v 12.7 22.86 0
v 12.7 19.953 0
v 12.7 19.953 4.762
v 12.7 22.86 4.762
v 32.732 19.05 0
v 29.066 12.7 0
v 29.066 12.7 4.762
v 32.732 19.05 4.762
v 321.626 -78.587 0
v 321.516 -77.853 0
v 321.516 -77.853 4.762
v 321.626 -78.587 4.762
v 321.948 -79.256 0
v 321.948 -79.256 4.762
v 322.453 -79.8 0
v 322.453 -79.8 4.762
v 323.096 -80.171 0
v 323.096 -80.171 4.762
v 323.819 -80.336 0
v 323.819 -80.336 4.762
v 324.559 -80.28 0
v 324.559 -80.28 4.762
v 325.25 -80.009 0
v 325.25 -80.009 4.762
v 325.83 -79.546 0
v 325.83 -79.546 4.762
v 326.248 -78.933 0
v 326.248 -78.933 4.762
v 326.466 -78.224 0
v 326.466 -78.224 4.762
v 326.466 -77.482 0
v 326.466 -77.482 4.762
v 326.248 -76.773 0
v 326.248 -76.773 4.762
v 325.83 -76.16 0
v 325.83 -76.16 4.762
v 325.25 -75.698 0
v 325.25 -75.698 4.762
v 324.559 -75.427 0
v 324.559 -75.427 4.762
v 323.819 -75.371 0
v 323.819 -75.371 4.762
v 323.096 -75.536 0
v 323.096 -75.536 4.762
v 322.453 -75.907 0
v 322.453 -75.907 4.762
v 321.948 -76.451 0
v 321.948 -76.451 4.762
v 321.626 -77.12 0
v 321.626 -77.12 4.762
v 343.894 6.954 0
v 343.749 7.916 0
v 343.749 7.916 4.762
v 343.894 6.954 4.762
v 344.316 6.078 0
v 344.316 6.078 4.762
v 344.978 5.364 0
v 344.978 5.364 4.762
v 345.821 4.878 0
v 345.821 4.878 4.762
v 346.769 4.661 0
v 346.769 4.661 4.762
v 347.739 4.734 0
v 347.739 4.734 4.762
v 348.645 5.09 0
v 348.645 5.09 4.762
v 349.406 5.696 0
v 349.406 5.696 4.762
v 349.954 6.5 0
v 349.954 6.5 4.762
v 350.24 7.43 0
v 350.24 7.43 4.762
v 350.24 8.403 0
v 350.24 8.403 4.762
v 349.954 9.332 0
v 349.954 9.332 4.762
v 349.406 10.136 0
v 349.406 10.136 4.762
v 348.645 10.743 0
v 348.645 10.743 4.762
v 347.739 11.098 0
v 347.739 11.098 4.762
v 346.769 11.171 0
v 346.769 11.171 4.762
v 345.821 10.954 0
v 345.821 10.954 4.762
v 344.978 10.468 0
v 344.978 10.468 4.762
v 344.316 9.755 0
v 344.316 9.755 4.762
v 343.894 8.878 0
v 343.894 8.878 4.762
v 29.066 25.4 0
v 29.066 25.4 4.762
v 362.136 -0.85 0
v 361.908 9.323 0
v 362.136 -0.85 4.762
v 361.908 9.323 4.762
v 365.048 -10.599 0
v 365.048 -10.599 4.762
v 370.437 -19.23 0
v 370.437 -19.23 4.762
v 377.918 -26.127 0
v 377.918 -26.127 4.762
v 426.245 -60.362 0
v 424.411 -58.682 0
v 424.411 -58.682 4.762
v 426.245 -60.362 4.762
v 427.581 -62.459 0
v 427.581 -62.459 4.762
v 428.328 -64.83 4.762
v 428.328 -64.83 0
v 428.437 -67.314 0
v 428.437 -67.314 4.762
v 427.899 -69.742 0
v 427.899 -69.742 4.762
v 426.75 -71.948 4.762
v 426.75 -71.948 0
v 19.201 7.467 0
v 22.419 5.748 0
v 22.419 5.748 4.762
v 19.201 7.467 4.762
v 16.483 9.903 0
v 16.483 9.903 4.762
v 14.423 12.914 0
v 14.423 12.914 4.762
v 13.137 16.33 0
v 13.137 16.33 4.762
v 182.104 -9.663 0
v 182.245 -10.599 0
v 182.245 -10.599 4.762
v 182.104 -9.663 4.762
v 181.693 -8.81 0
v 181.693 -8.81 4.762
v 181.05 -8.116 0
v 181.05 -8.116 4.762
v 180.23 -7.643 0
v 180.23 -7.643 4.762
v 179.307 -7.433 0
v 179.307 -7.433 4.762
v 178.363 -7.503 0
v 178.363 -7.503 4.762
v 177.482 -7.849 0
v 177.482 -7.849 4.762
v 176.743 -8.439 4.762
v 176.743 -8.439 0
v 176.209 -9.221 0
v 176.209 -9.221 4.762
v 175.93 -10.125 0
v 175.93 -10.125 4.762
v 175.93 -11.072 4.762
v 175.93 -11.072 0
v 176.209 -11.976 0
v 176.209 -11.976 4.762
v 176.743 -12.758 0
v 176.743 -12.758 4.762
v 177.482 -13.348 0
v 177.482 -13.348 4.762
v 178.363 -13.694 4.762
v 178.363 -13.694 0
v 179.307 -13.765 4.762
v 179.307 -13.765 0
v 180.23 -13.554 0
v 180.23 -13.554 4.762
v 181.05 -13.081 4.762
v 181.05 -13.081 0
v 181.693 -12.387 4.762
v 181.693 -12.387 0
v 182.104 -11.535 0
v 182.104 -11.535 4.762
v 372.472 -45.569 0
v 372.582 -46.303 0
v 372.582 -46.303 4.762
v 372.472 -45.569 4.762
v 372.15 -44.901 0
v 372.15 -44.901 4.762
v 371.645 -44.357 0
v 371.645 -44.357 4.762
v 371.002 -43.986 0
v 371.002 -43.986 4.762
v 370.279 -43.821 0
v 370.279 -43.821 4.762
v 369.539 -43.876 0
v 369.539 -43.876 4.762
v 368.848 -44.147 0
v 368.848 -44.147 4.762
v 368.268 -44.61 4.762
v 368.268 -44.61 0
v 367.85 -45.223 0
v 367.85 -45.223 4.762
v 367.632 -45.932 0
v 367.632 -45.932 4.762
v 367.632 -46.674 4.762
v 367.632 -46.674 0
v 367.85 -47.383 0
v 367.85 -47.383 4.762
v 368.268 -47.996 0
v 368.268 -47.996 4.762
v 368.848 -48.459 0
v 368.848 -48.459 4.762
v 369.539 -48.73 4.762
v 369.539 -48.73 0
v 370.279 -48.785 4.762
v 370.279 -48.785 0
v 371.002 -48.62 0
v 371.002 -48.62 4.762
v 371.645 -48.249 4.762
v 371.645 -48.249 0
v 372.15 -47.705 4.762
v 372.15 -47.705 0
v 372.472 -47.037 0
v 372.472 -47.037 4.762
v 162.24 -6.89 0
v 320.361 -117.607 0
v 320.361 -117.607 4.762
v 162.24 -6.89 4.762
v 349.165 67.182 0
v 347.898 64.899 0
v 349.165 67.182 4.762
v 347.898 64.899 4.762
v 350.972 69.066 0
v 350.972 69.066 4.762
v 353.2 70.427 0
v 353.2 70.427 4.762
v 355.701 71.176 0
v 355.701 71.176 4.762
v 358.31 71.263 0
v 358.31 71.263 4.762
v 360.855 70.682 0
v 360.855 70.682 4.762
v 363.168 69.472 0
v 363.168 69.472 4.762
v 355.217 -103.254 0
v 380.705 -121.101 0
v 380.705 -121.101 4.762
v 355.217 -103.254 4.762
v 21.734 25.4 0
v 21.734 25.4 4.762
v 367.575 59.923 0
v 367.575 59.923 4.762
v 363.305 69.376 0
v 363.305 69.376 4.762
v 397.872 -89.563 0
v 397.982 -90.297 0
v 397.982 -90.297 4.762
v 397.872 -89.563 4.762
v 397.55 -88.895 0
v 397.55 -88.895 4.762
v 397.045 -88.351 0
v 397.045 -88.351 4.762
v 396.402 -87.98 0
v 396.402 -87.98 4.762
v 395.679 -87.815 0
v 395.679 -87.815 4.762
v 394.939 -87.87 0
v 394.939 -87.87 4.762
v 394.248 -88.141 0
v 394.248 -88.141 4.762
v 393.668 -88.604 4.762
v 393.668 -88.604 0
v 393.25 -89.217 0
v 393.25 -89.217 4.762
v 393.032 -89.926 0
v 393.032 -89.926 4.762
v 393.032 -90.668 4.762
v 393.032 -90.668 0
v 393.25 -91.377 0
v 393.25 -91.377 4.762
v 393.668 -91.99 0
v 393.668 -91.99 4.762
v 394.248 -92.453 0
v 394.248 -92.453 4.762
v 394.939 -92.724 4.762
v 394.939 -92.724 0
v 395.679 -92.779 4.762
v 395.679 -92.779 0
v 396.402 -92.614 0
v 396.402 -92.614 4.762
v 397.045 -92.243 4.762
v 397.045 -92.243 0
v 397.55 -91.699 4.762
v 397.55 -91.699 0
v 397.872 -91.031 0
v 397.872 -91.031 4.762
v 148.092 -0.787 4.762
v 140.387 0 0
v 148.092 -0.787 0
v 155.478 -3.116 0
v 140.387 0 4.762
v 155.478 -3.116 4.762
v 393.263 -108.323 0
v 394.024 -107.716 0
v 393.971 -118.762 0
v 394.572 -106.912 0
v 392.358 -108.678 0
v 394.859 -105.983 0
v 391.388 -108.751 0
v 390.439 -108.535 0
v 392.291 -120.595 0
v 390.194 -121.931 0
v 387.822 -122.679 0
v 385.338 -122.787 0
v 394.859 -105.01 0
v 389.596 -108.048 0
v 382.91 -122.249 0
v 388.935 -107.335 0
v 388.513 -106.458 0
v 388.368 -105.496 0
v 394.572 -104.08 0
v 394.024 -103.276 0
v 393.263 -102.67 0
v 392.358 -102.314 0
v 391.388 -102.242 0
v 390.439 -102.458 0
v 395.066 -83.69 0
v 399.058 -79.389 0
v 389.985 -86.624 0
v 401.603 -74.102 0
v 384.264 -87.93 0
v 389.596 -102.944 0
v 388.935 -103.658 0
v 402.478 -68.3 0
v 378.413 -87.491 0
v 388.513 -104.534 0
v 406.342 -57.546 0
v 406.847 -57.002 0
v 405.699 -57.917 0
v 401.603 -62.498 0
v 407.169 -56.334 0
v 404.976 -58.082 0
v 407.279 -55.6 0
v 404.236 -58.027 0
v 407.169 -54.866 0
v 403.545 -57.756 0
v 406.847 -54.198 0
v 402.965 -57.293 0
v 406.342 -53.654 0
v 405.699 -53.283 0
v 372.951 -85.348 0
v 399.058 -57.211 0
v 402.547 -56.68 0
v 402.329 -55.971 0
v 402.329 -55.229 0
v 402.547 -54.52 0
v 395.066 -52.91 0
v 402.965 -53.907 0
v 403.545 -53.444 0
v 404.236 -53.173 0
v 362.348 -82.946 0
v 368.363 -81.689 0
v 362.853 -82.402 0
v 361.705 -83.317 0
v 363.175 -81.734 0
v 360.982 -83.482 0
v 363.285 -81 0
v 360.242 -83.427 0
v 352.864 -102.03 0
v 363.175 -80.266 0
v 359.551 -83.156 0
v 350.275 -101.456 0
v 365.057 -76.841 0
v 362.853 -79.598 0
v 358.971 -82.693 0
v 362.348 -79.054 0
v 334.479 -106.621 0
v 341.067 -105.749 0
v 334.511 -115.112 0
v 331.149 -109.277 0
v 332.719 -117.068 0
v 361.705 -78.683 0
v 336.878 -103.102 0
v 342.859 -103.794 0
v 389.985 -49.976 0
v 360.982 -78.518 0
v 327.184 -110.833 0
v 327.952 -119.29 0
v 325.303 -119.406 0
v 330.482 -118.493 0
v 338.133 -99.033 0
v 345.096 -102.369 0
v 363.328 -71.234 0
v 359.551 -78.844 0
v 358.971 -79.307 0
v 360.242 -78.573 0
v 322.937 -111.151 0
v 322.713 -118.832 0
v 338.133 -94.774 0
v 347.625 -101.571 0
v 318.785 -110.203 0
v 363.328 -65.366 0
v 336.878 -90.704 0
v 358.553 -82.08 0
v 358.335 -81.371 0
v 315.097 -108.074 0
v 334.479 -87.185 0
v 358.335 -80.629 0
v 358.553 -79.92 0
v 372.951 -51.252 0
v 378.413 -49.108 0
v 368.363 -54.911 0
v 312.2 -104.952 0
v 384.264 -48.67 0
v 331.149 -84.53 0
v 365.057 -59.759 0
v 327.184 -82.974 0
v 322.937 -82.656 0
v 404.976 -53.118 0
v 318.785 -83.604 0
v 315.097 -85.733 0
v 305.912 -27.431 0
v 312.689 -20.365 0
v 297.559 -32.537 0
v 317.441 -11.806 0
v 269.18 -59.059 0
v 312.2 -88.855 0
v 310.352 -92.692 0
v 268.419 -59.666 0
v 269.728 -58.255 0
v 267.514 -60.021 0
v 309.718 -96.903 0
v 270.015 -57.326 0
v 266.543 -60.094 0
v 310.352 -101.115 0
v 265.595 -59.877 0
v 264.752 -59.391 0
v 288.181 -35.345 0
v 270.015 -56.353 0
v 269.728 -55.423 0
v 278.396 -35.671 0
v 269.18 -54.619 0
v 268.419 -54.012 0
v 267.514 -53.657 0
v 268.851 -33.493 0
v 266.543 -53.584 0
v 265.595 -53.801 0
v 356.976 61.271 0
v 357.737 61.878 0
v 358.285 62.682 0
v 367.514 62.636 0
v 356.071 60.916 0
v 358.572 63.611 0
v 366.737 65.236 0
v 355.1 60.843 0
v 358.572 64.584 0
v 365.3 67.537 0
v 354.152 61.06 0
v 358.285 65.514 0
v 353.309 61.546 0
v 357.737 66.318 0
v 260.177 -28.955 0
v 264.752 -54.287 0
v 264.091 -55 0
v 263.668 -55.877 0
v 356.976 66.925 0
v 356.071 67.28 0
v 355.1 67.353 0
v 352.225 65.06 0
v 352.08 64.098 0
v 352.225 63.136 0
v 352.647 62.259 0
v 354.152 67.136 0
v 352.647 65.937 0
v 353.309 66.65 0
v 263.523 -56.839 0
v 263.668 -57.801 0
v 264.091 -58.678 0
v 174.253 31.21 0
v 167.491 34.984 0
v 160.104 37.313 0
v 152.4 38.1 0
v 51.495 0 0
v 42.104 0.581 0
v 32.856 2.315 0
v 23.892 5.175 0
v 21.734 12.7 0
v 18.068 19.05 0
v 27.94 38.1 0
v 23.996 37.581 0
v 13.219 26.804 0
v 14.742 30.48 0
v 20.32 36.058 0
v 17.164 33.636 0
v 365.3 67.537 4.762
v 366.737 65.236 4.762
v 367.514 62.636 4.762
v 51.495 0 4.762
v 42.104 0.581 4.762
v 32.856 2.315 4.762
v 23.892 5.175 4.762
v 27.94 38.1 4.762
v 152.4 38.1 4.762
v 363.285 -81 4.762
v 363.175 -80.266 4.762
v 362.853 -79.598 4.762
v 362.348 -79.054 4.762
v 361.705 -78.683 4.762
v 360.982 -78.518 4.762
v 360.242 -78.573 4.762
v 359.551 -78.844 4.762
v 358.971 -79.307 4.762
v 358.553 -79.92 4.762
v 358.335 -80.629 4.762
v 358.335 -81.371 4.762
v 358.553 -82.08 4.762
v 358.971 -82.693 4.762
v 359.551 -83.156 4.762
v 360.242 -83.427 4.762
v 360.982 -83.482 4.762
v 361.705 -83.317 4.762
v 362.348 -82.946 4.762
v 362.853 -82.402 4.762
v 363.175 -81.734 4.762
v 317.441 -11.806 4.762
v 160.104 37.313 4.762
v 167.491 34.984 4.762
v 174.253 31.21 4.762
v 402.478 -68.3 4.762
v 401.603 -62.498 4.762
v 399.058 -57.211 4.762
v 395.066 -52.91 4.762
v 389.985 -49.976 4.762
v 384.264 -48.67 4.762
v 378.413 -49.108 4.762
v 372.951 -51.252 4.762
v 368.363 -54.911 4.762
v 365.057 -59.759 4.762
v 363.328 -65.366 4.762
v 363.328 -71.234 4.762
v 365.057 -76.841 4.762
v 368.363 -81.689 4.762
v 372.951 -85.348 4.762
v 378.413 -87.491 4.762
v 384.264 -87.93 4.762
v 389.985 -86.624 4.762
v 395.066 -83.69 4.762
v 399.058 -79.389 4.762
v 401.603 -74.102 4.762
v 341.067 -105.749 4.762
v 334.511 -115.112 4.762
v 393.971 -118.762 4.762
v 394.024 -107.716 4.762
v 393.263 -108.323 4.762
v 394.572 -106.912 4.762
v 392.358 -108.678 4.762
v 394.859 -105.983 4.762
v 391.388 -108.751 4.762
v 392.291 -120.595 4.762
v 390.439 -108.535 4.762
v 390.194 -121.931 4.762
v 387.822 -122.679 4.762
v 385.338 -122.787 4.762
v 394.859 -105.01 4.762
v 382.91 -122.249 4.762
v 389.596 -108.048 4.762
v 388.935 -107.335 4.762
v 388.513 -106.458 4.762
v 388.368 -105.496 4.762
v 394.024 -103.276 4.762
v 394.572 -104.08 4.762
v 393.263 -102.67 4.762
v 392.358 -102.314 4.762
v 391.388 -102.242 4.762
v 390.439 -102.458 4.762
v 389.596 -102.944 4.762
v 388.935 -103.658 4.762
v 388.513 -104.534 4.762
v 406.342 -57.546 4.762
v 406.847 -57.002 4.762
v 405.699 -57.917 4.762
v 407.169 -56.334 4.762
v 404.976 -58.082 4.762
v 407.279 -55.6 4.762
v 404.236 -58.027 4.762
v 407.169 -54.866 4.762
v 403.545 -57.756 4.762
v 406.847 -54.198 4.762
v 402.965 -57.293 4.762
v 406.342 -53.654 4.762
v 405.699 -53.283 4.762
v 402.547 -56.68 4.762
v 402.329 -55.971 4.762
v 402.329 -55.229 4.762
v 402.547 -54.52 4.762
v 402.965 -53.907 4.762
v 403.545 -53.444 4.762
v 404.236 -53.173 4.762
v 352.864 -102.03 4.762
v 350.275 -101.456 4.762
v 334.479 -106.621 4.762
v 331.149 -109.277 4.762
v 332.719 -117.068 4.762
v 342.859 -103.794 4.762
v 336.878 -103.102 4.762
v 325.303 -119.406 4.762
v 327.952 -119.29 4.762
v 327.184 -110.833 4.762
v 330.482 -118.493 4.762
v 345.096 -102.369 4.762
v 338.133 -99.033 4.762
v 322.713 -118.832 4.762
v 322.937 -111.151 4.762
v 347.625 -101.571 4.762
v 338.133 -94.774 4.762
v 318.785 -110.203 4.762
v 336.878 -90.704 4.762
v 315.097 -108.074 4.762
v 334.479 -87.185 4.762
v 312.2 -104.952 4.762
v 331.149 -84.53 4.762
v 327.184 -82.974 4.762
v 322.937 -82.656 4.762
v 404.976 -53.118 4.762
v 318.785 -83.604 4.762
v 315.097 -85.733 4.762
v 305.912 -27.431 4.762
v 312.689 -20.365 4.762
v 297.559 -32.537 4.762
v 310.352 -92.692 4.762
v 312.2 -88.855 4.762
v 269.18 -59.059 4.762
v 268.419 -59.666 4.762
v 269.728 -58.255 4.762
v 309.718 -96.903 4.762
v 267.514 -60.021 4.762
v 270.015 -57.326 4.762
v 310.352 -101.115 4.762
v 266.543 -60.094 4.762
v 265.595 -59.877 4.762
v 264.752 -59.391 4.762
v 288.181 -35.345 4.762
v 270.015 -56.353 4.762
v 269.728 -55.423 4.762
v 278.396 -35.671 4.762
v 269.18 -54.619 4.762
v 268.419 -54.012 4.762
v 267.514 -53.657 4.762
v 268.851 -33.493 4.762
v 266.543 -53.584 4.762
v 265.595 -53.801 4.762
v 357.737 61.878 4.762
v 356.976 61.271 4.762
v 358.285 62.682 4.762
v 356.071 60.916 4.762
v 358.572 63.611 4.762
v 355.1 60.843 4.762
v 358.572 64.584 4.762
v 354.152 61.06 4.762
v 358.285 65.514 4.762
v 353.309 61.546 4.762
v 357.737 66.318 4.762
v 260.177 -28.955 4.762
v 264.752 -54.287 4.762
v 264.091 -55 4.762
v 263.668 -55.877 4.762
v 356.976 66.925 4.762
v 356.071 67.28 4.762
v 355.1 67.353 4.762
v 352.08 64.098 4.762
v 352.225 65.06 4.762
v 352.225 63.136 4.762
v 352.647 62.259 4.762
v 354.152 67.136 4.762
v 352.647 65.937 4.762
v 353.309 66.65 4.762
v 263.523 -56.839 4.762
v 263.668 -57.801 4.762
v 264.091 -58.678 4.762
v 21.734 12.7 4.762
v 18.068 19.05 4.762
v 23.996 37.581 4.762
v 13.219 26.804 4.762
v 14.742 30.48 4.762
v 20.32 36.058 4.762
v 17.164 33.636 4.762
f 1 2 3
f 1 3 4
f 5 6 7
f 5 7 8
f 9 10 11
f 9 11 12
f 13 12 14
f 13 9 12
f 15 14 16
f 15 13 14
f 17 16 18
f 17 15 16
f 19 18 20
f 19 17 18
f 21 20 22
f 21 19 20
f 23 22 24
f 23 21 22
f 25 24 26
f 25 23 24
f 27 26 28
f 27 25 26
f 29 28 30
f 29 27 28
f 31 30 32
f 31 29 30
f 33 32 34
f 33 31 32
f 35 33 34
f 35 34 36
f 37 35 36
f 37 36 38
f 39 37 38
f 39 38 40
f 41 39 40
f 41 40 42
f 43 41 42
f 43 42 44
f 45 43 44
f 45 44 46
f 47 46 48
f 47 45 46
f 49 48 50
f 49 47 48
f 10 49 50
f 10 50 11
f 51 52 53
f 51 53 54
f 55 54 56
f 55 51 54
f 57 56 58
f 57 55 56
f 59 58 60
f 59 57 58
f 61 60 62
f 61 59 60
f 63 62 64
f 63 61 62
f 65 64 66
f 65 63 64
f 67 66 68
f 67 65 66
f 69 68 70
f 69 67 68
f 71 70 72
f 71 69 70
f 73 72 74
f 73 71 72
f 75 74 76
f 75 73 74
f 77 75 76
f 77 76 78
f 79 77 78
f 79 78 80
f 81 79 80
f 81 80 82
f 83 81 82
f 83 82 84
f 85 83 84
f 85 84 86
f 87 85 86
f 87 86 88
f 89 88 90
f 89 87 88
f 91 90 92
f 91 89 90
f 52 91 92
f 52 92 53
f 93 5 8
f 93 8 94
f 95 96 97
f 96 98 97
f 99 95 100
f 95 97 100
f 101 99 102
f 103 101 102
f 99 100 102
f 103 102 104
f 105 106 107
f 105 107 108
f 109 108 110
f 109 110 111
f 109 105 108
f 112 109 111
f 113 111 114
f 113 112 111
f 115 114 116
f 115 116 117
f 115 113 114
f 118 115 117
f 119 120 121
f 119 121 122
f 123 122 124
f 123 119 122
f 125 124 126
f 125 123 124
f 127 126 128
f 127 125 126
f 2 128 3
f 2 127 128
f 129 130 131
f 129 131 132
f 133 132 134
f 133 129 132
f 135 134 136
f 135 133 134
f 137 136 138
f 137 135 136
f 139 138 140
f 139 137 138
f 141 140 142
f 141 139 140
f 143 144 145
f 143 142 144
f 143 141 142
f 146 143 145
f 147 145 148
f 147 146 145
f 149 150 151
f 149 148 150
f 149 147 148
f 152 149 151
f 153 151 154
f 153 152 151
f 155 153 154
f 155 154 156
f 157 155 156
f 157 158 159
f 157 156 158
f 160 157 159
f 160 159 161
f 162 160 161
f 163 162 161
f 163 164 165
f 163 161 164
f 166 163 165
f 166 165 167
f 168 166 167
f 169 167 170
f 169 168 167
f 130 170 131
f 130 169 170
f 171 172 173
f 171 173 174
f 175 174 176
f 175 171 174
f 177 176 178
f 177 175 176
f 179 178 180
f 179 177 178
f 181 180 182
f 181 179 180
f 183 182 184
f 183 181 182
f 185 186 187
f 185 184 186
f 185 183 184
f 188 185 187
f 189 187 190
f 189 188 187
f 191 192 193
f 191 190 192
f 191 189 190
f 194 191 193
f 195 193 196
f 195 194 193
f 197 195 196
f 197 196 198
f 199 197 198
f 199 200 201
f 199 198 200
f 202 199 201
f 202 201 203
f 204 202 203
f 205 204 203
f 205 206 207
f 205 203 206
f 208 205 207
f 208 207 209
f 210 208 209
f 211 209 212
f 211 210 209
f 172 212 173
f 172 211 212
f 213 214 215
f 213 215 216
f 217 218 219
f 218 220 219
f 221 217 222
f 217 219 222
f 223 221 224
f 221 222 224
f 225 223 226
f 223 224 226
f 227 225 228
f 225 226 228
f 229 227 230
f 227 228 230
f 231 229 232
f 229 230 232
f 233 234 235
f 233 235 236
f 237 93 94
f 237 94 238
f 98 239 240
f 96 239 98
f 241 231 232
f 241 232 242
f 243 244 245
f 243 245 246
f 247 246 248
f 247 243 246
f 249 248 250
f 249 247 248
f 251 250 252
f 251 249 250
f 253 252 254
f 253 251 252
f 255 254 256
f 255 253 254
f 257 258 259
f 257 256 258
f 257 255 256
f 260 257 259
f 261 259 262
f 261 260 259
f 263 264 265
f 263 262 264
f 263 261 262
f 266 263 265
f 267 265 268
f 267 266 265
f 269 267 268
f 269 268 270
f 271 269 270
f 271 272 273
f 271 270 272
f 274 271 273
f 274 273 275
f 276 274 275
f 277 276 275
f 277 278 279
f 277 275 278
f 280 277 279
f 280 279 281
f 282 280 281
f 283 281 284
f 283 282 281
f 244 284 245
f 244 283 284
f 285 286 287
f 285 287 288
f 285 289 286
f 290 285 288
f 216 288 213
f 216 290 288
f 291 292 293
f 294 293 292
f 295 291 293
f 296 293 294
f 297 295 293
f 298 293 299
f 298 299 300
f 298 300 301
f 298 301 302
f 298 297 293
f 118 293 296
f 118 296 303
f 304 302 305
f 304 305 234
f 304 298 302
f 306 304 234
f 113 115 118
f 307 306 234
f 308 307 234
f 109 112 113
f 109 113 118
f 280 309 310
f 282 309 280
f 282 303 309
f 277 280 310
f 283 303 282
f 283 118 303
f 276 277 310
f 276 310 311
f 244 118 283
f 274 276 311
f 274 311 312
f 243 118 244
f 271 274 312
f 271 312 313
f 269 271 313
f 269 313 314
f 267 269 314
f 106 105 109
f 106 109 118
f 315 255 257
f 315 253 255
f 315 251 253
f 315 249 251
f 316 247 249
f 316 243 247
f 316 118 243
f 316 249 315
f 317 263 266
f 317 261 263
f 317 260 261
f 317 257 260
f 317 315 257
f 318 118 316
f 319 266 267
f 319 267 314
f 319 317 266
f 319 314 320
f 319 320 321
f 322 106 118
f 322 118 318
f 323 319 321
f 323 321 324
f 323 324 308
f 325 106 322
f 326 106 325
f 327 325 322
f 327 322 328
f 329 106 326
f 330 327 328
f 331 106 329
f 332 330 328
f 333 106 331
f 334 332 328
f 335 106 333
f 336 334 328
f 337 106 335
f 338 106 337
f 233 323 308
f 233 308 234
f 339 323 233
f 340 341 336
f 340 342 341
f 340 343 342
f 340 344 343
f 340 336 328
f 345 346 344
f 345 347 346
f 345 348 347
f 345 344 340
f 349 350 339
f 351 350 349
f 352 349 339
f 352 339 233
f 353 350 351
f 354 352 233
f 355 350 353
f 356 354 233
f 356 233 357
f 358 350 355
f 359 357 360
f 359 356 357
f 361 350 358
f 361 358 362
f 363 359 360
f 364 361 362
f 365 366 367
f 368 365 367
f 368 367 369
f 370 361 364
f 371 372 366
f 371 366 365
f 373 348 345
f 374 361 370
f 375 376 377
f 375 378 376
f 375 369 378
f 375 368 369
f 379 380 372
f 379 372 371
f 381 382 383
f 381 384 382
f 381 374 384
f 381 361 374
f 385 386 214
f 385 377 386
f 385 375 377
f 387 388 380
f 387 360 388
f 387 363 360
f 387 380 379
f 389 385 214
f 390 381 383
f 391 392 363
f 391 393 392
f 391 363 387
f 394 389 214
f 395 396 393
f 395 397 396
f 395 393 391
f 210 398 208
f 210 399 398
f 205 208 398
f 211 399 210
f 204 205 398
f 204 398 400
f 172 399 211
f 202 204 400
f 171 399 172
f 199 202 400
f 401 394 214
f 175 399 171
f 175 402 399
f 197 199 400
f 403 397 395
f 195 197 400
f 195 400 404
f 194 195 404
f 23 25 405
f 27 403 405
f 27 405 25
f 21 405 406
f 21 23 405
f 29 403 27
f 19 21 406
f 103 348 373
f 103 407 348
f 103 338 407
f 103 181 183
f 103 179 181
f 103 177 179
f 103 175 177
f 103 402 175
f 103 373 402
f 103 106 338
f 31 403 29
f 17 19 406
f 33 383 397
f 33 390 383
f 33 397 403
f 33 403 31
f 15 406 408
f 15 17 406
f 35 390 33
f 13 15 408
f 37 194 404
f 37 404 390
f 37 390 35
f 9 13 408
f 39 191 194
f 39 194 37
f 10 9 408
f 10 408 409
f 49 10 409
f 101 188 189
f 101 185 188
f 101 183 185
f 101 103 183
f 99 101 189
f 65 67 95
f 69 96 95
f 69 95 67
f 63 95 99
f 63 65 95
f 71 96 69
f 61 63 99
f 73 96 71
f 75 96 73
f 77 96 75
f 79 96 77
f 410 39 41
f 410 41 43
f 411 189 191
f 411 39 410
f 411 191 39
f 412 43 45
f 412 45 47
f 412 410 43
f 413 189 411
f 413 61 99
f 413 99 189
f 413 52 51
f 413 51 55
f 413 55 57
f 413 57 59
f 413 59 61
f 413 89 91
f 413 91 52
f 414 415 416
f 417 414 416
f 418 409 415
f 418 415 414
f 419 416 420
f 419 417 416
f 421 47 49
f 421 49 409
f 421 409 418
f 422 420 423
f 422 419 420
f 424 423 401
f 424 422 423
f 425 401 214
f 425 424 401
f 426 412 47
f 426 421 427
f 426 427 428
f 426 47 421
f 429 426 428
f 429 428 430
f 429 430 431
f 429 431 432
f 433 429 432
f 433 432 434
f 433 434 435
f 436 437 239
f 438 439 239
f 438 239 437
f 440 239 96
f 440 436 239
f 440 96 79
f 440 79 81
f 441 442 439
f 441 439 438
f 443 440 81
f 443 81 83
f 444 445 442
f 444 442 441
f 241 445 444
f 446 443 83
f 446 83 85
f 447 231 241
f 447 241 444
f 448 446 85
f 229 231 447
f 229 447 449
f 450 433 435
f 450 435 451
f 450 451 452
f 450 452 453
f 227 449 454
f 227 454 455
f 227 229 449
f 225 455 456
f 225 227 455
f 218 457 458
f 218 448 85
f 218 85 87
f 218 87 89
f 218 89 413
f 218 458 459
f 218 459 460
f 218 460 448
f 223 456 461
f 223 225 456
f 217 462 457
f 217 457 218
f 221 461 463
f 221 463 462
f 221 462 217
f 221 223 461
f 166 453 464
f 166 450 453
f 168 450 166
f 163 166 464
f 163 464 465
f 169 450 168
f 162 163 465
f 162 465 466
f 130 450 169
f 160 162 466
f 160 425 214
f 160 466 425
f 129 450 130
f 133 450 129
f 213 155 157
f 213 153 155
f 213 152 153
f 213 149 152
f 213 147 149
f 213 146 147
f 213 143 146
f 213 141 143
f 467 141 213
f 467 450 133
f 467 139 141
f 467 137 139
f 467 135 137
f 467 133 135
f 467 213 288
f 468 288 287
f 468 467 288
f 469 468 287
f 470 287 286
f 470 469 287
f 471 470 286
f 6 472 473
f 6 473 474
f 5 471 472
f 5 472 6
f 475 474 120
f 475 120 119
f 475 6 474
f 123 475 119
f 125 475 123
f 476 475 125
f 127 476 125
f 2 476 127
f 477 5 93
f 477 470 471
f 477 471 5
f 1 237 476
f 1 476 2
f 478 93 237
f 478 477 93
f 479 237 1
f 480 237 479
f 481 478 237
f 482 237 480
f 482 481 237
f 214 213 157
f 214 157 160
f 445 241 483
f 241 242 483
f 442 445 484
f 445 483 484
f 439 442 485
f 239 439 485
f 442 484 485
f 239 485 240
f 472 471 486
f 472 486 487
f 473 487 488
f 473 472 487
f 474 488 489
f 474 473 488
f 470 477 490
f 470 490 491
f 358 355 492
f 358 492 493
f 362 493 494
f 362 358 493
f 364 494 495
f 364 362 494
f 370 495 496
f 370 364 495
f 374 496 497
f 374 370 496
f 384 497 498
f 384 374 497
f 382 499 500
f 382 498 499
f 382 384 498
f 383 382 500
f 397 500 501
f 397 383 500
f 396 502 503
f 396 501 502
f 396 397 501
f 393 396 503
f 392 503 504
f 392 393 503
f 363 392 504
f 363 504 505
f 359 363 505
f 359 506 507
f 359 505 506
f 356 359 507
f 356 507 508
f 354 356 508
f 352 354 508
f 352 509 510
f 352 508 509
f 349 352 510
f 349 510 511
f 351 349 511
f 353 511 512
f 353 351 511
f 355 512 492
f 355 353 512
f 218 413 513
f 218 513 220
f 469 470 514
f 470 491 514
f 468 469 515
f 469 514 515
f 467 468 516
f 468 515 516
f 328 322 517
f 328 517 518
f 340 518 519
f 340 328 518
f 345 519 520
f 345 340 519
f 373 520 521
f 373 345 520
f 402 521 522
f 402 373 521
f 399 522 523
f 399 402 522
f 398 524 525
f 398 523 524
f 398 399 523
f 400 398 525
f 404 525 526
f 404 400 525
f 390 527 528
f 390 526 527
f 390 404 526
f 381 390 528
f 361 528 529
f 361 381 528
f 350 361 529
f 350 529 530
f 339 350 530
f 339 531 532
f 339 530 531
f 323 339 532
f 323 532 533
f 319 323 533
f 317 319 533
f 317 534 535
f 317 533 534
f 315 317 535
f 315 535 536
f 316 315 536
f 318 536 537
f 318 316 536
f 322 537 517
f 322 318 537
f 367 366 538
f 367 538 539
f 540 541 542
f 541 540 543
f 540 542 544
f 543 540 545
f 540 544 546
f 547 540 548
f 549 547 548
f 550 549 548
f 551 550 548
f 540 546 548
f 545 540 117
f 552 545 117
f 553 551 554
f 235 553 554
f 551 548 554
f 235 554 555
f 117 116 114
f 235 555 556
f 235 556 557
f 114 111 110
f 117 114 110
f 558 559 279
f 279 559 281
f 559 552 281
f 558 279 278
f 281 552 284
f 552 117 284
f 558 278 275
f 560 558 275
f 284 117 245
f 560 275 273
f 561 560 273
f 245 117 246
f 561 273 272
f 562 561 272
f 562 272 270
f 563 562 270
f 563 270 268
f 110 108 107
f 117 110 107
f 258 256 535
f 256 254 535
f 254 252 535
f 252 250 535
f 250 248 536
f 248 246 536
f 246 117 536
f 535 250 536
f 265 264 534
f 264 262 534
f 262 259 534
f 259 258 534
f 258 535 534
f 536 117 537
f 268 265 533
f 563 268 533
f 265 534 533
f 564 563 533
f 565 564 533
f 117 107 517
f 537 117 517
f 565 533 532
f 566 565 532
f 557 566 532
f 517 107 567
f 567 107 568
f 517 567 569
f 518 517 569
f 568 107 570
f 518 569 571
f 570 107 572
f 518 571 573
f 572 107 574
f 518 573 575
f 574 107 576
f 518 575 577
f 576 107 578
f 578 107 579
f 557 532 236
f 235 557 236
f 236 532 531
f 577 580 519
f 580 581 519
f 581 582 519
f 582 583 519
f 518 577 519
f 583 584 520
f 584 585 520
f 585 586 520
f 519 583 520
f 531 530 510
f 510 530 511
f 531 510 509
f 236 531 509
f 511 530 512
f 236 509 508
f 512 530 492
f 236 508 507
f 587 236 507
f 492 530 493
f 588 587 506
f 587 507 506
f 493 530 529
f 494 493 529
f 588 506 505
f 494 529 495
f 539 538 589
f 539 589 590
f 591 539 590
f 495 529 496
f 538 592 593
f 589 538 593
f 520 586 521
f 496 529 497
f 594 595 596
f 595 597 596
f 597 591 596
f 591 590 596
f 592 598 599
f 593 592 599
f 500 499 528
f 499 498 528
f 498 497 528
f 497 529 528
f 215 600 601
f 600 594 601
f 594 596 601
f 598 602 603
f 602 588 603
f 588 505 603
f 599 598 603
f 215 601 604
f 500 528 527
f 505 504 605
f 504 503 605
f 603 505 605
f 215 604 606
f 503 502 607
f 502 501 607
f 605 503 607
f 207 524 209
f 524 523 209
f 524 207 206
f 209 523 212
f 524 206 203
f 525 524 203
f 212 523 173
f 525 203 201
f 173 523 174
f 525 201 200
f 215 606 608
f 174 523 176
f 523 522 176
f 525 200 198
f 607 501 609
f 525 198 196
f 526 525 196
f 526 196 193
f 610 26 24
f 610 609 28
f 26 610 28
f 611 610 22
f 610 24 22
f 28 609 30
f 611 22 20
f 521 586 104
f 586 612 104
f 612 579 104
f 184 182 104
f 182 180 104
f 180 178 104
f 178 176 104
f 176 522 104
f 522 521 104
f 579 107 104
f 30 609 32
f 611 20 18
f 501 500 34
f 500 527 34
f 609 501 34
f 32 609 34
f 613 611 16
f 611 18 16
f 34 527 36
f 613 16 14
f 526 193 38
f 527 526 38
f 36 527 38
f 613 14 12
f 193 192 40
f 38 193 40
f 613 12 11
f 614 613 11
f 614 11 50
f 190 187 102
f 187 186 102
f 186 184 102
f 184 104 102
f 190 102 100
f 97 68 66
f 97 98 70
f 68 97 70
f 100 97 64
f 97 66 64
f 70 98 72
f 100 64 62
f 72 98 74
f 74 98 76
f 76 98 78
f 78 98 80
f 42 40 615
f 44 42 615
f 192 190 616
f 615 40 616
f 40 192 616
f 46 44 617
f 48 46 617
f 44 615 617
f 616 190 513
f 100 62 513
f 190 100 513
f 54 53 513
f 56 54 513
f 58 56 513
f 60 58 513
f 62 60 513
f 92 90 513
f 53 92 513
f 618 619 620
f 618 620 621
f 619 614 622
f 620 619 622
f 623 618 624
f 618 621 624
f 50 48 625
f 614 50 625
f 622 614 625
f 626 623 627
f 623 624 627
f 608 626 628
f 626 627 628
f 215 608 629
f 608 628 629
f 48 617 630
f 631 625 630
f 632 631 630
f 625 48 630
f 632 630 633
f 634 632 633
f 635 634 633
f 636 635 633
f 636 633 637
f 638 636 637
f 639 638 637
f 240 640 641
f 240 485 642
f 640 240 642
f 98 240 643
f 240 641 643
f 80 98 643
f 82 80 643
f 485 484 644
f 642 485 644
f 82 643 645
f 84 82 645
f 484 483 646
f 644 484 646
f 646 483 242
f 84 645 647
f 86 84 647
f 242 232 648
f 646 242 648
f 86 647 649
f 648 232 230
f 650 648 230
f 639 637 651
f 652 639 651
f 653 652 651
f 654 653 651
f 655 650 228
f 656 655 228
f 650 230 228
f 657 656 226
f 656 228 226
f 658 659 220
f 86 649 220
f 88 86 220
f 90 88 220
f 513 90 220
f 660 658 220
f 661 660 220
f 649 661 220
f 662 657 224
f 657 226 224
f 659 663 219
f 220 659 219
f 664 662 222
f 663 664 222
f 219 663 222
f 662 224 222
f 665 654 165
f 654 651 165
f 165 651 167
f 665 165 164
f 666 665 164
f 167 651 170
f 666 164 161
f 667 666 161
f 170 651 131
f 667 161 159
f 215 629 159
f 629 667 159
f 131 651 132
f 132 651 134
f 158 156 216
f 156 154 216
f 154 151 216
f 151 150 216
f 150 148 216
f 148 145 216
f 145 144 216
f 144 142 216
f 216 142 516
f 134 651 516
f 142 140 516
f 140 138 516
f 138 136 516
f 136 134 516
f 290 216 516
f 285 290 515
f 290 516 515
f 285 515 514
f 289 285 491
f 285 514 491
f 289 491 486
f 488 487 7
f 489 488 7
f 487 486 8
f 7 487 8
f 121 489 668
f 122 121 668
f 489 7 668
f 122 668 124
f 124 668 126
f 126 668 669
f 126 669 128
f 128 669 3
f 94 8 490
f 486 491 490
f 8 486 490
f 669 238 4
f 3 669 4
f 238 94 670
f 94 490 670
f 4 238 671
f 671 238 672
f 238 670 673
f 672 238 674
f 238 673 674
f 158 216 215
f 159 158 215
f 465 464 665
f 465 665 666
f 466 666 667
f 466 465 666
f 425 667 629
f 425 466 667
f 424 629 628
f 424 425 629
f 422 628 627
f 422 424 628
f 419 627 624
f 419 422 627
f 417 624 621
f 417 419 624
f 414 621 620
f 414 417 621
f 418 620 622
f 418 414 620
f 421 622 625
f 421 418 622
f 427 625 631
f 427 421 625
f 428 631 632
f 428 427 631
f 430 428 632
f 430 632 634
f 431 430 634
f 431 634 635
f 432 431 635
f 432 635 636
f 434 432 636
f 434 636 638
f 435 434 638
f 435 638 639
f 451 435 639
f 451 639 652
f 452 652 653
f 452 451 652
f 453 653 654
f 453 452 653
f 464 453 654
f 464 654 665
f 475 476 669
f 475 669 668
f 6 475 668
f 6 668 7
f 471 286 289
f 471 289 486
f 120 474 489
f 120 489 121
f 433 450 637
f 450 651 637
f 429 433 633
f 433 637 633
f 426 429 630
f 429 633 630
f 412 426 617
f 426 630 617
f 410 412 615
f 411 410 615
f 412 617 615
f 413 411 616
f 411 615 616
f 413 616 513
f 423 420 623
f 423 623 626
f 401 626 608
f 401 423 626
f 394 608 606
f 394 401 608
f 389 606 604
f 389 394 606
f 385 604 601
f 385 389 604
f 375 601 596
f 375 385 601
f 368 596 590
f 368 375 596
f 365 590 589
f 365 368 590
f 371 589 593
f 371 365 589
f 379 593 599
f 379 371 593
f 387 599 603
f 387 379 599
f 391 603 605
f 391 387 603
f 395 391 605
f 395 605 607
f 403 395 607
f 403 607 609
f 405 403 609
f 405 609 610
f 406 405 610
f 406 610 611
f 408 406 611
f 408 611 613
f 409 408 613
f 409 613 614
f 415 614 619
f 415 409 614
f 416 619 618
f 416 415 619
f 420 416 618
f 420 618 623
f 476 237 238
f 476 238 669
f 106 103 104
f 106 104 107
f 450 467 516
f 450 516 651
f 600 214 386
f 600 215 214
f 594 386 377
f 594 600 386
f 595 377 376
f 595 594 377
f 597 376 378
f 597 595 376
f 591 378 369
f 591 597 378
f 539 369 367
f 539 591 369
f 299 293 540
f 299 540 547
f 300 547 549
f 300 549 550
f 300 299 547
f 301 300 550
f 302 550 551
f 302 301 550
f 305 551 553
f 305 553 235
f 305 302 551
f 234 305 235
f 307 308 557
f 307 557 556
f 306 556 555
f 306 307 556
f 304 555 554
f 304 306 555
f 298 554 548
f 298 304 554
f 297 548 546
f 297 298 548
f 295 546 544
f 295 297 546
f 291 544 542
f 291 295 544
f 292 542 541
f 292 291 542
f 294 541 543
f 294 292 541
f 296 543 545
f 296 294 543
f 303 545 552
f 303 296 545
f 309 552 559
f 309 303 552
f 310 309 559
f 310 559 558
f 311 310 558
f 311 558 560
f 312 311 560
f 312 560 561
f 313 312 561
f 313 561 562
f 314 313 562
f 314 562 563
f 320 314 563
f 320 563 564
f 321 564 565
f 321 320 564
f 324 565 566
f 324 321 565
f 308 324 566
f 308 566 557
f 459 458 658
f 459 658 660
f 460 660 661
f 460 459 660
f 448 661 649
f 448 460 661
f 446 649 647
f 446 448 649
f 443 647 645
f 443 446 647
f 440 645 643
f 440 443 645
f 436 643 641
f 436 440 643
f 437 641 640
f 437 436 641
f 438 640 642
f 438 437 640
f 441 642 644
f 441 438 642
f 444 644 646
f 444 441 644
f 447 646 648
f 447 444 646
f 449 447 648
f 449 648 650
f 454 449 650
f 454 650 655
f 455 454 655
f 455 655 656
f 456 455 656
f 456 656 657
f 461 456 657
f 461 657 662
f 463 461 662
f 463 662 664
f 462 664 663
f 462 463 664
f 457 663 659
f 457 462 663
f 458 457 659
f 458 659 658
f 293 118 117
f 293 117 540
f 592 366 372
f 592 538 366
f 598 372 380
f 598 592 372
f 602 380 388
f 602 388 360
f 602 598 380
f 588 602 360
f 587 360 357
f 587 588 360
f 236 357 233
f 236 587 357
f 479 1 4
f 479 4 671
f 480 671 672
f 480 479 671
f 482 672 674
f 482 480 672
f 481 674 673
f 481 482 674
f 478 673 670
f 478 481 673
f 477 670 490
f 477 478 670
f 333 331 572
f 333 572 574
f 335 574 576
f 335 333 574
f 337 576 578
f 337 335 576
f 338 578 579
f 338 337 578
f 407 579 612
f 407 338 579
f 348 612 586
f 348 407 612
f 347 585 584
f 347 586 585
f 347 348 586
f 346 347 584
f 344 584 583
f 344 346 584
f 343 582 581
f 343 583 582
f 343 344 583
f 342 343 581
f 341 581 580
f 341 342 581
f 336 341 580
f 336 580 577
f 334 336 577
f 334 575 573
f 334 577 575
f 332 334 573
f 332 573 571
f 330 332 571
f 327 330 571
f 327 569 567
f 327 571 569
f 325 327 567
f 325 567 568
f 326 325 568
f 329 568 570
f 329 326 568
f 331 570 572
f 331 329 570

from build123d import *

# Parameters (mm, degrees)
SKETCH1_R               = 14.2875
SKETCH1_R_2             = 3.2639
SKETCH1_R_3             = 2.4892
BOSS_EXTRUDE1_DEPTH     = 4.7625
CUT_EXTRUDE1_DEPTH      = 446.923725363
CUT_EXTRUDE1_DEPTH_BACK = 446.923725363
SKETCH2_R               = 19.685
SKETCH2_R_2             = 2.4892
SKETCH2_R_3             = 3.175
FILLET3_R               = 38.1
FILLET4_R               = 10.16


with BuildPart() as part:
    # Sketch1 → Boss-Extrude1 (new body)
    with BuildSketch(Plane.XY):
        with BuildLine():
            Line((27.94, 38.1), (164.412883856, 38.1))
            Line((164.412883856, 38.1), (299.654886368, -56.597469642))
            Line((299.654886368, -56.597469642), (352.6409093, 76.843527732))
            Line((352.6409093, 76.843527732), (368.245755744, 65.91689662))
            Line((368.245755744, 65.91689662), (359.391134552, -13.154135899))
            Line((359.391134552, -13.154135899), (424.411328067, -58.681765534))
            ThreePointArc((424.411328067, -58.681765534), (428.328306358, -64.830189864), (426.750435733, -71.947504312))
            Line((426.750435733, -71.947504312), (393.970542395, -118.762043644))
            ThreePointArc((393.970542395, -118.762043644), (387.822118066, -122.679021935), (380.704803617, -121.101151309))
            Line((380.704803617, -121.101151309), (346.894302989, -97.426783899))
            Line((346.894302989, -97.426783899), (328.683251135, -123.434861305))
            Line((328.683251135, -123.434861305), (152.4, 0))
            Line((152.4, 0), (51.495079847, 0))
            ThreePointArc((51.495079847, 0), (37.452913318, 1.305023138), (23.891727162, 5.175392148))
            Line((23.891727162, 5.175392148), (22.419329463, 5.747632027))
            ThreePointArc((22.419329463, 5.747632027), (15.362388562, 11.346666629), (12.7, 19.952553597))
            Line((12.7, 19.952553597), (12.7, 22.86))
            ThreePointArc((12.7, 22.86), (17.163692655, 33.636307345), (27.94, 38.1))
        make_face()
        with Locations(Location((324.005035804, -96.903383749, 0), (0, 0, 180))):
            Circle(SKETCH1_R, mode=Mode.SUBTRACT)
        with Locations(Location((347.013016961, 7.916185169, 0), (0, 0, 180))):
            Circle(SKETCH1_R_2, mode=Mode.SUBTRACT)
        with Locations(Location((324.005035804, -77.853383749, 0), (0, 0, 180))):
            Circle(SKETCH1_R_3, mode=Mode.SUBTRACT)
        with Locations(Location((355.344238002, 64.097950502, 0), (0, 0, 180))):
            Circle(SKETCH1_R_2, mode=Mode.SUBTRACT)
        with Locations(Location((391.63143473, -105.496304865, 0), (0, 0, 180))):
            Circle(SKETCH1_R_2, mode=Mode.SUBTRACT)
        with Locations(Location((266.78726551, -56.83906967, 0), (0, 0, 180))):
            Circle(SKETCH1_R_2, mode=Mode.SUBTRACT)
        Polygon((18.067651581, 19.05), (21.733825791, 12.7), (29.066174209, 12.7), (32.732348419, 19.05), (29.066174209, 25.4), (21.733825791, 25.4), align=None, mode=Mode.SUBTRACT)
    extrude(amount=BOSS_EXTRUDE1_DEPTH)

    # Sketch2 → Cut-Extrude1 (cut, two sides: drawn at the far end of the back side and taken through both)
    with BuildSketch(Plane.XY.offset(4.7625).offset(-CUT_EXTRUDE1_DEPTH_BACK)):
        with Locations((382.793006548, -68.299896272)):
            Circle(SKETCH2_R)
        with Locations((395.493006548, -90.296941528)):
            Circle(SKETCH2_R_2)
        with Locations((360.795961291, -80.999896272)):
            Circle(SKETCH2_R_2)
        with Locations((370.093006548, -46.302851016)):
            Circle(SKETCH2_R_2)
        with Locations((404.790051804, -55.599896272)):
            Circle(SKETCH2_R_2)
        with Locations((179.07, -10.598705626)):
            Circle(SKETCH2_R_3)
    extrude(amount=CUT_EXTRUDE1_DEPTH + CUT_EXTRUDE1_DEPTH_BACK, mode=Mode.SUBTRACT)

    # Fillet3
    fillet3_edges = [part.edges().sort_by_distance(p)[0] for p in [
        (164.412883856, 38.1, 2.38125),
        (299.654886368, -56.597469642, 2.38125),
        (359.391134552, -13.154135899, 2.38125),
        (152.4, 0, 2.38125),
    ]]
    fillet(fillet3_edges, radius=FILLET3_R)

    # Fillet4
    fillet4_edges = [part.edges().sort_by_distance(p)[0] for p in [
        (352.6409093, 76.843527732, 2.38125),
        (368.245755744, 65.91689662, 2.38125),
        (346.894302989, -97.426783899, 2.38125),
        (328.683251135, -123.434861305, 2.38125),
    ]]
    fillet(fillet4_edges, radius=FILLET4_R)


solid = part.part
